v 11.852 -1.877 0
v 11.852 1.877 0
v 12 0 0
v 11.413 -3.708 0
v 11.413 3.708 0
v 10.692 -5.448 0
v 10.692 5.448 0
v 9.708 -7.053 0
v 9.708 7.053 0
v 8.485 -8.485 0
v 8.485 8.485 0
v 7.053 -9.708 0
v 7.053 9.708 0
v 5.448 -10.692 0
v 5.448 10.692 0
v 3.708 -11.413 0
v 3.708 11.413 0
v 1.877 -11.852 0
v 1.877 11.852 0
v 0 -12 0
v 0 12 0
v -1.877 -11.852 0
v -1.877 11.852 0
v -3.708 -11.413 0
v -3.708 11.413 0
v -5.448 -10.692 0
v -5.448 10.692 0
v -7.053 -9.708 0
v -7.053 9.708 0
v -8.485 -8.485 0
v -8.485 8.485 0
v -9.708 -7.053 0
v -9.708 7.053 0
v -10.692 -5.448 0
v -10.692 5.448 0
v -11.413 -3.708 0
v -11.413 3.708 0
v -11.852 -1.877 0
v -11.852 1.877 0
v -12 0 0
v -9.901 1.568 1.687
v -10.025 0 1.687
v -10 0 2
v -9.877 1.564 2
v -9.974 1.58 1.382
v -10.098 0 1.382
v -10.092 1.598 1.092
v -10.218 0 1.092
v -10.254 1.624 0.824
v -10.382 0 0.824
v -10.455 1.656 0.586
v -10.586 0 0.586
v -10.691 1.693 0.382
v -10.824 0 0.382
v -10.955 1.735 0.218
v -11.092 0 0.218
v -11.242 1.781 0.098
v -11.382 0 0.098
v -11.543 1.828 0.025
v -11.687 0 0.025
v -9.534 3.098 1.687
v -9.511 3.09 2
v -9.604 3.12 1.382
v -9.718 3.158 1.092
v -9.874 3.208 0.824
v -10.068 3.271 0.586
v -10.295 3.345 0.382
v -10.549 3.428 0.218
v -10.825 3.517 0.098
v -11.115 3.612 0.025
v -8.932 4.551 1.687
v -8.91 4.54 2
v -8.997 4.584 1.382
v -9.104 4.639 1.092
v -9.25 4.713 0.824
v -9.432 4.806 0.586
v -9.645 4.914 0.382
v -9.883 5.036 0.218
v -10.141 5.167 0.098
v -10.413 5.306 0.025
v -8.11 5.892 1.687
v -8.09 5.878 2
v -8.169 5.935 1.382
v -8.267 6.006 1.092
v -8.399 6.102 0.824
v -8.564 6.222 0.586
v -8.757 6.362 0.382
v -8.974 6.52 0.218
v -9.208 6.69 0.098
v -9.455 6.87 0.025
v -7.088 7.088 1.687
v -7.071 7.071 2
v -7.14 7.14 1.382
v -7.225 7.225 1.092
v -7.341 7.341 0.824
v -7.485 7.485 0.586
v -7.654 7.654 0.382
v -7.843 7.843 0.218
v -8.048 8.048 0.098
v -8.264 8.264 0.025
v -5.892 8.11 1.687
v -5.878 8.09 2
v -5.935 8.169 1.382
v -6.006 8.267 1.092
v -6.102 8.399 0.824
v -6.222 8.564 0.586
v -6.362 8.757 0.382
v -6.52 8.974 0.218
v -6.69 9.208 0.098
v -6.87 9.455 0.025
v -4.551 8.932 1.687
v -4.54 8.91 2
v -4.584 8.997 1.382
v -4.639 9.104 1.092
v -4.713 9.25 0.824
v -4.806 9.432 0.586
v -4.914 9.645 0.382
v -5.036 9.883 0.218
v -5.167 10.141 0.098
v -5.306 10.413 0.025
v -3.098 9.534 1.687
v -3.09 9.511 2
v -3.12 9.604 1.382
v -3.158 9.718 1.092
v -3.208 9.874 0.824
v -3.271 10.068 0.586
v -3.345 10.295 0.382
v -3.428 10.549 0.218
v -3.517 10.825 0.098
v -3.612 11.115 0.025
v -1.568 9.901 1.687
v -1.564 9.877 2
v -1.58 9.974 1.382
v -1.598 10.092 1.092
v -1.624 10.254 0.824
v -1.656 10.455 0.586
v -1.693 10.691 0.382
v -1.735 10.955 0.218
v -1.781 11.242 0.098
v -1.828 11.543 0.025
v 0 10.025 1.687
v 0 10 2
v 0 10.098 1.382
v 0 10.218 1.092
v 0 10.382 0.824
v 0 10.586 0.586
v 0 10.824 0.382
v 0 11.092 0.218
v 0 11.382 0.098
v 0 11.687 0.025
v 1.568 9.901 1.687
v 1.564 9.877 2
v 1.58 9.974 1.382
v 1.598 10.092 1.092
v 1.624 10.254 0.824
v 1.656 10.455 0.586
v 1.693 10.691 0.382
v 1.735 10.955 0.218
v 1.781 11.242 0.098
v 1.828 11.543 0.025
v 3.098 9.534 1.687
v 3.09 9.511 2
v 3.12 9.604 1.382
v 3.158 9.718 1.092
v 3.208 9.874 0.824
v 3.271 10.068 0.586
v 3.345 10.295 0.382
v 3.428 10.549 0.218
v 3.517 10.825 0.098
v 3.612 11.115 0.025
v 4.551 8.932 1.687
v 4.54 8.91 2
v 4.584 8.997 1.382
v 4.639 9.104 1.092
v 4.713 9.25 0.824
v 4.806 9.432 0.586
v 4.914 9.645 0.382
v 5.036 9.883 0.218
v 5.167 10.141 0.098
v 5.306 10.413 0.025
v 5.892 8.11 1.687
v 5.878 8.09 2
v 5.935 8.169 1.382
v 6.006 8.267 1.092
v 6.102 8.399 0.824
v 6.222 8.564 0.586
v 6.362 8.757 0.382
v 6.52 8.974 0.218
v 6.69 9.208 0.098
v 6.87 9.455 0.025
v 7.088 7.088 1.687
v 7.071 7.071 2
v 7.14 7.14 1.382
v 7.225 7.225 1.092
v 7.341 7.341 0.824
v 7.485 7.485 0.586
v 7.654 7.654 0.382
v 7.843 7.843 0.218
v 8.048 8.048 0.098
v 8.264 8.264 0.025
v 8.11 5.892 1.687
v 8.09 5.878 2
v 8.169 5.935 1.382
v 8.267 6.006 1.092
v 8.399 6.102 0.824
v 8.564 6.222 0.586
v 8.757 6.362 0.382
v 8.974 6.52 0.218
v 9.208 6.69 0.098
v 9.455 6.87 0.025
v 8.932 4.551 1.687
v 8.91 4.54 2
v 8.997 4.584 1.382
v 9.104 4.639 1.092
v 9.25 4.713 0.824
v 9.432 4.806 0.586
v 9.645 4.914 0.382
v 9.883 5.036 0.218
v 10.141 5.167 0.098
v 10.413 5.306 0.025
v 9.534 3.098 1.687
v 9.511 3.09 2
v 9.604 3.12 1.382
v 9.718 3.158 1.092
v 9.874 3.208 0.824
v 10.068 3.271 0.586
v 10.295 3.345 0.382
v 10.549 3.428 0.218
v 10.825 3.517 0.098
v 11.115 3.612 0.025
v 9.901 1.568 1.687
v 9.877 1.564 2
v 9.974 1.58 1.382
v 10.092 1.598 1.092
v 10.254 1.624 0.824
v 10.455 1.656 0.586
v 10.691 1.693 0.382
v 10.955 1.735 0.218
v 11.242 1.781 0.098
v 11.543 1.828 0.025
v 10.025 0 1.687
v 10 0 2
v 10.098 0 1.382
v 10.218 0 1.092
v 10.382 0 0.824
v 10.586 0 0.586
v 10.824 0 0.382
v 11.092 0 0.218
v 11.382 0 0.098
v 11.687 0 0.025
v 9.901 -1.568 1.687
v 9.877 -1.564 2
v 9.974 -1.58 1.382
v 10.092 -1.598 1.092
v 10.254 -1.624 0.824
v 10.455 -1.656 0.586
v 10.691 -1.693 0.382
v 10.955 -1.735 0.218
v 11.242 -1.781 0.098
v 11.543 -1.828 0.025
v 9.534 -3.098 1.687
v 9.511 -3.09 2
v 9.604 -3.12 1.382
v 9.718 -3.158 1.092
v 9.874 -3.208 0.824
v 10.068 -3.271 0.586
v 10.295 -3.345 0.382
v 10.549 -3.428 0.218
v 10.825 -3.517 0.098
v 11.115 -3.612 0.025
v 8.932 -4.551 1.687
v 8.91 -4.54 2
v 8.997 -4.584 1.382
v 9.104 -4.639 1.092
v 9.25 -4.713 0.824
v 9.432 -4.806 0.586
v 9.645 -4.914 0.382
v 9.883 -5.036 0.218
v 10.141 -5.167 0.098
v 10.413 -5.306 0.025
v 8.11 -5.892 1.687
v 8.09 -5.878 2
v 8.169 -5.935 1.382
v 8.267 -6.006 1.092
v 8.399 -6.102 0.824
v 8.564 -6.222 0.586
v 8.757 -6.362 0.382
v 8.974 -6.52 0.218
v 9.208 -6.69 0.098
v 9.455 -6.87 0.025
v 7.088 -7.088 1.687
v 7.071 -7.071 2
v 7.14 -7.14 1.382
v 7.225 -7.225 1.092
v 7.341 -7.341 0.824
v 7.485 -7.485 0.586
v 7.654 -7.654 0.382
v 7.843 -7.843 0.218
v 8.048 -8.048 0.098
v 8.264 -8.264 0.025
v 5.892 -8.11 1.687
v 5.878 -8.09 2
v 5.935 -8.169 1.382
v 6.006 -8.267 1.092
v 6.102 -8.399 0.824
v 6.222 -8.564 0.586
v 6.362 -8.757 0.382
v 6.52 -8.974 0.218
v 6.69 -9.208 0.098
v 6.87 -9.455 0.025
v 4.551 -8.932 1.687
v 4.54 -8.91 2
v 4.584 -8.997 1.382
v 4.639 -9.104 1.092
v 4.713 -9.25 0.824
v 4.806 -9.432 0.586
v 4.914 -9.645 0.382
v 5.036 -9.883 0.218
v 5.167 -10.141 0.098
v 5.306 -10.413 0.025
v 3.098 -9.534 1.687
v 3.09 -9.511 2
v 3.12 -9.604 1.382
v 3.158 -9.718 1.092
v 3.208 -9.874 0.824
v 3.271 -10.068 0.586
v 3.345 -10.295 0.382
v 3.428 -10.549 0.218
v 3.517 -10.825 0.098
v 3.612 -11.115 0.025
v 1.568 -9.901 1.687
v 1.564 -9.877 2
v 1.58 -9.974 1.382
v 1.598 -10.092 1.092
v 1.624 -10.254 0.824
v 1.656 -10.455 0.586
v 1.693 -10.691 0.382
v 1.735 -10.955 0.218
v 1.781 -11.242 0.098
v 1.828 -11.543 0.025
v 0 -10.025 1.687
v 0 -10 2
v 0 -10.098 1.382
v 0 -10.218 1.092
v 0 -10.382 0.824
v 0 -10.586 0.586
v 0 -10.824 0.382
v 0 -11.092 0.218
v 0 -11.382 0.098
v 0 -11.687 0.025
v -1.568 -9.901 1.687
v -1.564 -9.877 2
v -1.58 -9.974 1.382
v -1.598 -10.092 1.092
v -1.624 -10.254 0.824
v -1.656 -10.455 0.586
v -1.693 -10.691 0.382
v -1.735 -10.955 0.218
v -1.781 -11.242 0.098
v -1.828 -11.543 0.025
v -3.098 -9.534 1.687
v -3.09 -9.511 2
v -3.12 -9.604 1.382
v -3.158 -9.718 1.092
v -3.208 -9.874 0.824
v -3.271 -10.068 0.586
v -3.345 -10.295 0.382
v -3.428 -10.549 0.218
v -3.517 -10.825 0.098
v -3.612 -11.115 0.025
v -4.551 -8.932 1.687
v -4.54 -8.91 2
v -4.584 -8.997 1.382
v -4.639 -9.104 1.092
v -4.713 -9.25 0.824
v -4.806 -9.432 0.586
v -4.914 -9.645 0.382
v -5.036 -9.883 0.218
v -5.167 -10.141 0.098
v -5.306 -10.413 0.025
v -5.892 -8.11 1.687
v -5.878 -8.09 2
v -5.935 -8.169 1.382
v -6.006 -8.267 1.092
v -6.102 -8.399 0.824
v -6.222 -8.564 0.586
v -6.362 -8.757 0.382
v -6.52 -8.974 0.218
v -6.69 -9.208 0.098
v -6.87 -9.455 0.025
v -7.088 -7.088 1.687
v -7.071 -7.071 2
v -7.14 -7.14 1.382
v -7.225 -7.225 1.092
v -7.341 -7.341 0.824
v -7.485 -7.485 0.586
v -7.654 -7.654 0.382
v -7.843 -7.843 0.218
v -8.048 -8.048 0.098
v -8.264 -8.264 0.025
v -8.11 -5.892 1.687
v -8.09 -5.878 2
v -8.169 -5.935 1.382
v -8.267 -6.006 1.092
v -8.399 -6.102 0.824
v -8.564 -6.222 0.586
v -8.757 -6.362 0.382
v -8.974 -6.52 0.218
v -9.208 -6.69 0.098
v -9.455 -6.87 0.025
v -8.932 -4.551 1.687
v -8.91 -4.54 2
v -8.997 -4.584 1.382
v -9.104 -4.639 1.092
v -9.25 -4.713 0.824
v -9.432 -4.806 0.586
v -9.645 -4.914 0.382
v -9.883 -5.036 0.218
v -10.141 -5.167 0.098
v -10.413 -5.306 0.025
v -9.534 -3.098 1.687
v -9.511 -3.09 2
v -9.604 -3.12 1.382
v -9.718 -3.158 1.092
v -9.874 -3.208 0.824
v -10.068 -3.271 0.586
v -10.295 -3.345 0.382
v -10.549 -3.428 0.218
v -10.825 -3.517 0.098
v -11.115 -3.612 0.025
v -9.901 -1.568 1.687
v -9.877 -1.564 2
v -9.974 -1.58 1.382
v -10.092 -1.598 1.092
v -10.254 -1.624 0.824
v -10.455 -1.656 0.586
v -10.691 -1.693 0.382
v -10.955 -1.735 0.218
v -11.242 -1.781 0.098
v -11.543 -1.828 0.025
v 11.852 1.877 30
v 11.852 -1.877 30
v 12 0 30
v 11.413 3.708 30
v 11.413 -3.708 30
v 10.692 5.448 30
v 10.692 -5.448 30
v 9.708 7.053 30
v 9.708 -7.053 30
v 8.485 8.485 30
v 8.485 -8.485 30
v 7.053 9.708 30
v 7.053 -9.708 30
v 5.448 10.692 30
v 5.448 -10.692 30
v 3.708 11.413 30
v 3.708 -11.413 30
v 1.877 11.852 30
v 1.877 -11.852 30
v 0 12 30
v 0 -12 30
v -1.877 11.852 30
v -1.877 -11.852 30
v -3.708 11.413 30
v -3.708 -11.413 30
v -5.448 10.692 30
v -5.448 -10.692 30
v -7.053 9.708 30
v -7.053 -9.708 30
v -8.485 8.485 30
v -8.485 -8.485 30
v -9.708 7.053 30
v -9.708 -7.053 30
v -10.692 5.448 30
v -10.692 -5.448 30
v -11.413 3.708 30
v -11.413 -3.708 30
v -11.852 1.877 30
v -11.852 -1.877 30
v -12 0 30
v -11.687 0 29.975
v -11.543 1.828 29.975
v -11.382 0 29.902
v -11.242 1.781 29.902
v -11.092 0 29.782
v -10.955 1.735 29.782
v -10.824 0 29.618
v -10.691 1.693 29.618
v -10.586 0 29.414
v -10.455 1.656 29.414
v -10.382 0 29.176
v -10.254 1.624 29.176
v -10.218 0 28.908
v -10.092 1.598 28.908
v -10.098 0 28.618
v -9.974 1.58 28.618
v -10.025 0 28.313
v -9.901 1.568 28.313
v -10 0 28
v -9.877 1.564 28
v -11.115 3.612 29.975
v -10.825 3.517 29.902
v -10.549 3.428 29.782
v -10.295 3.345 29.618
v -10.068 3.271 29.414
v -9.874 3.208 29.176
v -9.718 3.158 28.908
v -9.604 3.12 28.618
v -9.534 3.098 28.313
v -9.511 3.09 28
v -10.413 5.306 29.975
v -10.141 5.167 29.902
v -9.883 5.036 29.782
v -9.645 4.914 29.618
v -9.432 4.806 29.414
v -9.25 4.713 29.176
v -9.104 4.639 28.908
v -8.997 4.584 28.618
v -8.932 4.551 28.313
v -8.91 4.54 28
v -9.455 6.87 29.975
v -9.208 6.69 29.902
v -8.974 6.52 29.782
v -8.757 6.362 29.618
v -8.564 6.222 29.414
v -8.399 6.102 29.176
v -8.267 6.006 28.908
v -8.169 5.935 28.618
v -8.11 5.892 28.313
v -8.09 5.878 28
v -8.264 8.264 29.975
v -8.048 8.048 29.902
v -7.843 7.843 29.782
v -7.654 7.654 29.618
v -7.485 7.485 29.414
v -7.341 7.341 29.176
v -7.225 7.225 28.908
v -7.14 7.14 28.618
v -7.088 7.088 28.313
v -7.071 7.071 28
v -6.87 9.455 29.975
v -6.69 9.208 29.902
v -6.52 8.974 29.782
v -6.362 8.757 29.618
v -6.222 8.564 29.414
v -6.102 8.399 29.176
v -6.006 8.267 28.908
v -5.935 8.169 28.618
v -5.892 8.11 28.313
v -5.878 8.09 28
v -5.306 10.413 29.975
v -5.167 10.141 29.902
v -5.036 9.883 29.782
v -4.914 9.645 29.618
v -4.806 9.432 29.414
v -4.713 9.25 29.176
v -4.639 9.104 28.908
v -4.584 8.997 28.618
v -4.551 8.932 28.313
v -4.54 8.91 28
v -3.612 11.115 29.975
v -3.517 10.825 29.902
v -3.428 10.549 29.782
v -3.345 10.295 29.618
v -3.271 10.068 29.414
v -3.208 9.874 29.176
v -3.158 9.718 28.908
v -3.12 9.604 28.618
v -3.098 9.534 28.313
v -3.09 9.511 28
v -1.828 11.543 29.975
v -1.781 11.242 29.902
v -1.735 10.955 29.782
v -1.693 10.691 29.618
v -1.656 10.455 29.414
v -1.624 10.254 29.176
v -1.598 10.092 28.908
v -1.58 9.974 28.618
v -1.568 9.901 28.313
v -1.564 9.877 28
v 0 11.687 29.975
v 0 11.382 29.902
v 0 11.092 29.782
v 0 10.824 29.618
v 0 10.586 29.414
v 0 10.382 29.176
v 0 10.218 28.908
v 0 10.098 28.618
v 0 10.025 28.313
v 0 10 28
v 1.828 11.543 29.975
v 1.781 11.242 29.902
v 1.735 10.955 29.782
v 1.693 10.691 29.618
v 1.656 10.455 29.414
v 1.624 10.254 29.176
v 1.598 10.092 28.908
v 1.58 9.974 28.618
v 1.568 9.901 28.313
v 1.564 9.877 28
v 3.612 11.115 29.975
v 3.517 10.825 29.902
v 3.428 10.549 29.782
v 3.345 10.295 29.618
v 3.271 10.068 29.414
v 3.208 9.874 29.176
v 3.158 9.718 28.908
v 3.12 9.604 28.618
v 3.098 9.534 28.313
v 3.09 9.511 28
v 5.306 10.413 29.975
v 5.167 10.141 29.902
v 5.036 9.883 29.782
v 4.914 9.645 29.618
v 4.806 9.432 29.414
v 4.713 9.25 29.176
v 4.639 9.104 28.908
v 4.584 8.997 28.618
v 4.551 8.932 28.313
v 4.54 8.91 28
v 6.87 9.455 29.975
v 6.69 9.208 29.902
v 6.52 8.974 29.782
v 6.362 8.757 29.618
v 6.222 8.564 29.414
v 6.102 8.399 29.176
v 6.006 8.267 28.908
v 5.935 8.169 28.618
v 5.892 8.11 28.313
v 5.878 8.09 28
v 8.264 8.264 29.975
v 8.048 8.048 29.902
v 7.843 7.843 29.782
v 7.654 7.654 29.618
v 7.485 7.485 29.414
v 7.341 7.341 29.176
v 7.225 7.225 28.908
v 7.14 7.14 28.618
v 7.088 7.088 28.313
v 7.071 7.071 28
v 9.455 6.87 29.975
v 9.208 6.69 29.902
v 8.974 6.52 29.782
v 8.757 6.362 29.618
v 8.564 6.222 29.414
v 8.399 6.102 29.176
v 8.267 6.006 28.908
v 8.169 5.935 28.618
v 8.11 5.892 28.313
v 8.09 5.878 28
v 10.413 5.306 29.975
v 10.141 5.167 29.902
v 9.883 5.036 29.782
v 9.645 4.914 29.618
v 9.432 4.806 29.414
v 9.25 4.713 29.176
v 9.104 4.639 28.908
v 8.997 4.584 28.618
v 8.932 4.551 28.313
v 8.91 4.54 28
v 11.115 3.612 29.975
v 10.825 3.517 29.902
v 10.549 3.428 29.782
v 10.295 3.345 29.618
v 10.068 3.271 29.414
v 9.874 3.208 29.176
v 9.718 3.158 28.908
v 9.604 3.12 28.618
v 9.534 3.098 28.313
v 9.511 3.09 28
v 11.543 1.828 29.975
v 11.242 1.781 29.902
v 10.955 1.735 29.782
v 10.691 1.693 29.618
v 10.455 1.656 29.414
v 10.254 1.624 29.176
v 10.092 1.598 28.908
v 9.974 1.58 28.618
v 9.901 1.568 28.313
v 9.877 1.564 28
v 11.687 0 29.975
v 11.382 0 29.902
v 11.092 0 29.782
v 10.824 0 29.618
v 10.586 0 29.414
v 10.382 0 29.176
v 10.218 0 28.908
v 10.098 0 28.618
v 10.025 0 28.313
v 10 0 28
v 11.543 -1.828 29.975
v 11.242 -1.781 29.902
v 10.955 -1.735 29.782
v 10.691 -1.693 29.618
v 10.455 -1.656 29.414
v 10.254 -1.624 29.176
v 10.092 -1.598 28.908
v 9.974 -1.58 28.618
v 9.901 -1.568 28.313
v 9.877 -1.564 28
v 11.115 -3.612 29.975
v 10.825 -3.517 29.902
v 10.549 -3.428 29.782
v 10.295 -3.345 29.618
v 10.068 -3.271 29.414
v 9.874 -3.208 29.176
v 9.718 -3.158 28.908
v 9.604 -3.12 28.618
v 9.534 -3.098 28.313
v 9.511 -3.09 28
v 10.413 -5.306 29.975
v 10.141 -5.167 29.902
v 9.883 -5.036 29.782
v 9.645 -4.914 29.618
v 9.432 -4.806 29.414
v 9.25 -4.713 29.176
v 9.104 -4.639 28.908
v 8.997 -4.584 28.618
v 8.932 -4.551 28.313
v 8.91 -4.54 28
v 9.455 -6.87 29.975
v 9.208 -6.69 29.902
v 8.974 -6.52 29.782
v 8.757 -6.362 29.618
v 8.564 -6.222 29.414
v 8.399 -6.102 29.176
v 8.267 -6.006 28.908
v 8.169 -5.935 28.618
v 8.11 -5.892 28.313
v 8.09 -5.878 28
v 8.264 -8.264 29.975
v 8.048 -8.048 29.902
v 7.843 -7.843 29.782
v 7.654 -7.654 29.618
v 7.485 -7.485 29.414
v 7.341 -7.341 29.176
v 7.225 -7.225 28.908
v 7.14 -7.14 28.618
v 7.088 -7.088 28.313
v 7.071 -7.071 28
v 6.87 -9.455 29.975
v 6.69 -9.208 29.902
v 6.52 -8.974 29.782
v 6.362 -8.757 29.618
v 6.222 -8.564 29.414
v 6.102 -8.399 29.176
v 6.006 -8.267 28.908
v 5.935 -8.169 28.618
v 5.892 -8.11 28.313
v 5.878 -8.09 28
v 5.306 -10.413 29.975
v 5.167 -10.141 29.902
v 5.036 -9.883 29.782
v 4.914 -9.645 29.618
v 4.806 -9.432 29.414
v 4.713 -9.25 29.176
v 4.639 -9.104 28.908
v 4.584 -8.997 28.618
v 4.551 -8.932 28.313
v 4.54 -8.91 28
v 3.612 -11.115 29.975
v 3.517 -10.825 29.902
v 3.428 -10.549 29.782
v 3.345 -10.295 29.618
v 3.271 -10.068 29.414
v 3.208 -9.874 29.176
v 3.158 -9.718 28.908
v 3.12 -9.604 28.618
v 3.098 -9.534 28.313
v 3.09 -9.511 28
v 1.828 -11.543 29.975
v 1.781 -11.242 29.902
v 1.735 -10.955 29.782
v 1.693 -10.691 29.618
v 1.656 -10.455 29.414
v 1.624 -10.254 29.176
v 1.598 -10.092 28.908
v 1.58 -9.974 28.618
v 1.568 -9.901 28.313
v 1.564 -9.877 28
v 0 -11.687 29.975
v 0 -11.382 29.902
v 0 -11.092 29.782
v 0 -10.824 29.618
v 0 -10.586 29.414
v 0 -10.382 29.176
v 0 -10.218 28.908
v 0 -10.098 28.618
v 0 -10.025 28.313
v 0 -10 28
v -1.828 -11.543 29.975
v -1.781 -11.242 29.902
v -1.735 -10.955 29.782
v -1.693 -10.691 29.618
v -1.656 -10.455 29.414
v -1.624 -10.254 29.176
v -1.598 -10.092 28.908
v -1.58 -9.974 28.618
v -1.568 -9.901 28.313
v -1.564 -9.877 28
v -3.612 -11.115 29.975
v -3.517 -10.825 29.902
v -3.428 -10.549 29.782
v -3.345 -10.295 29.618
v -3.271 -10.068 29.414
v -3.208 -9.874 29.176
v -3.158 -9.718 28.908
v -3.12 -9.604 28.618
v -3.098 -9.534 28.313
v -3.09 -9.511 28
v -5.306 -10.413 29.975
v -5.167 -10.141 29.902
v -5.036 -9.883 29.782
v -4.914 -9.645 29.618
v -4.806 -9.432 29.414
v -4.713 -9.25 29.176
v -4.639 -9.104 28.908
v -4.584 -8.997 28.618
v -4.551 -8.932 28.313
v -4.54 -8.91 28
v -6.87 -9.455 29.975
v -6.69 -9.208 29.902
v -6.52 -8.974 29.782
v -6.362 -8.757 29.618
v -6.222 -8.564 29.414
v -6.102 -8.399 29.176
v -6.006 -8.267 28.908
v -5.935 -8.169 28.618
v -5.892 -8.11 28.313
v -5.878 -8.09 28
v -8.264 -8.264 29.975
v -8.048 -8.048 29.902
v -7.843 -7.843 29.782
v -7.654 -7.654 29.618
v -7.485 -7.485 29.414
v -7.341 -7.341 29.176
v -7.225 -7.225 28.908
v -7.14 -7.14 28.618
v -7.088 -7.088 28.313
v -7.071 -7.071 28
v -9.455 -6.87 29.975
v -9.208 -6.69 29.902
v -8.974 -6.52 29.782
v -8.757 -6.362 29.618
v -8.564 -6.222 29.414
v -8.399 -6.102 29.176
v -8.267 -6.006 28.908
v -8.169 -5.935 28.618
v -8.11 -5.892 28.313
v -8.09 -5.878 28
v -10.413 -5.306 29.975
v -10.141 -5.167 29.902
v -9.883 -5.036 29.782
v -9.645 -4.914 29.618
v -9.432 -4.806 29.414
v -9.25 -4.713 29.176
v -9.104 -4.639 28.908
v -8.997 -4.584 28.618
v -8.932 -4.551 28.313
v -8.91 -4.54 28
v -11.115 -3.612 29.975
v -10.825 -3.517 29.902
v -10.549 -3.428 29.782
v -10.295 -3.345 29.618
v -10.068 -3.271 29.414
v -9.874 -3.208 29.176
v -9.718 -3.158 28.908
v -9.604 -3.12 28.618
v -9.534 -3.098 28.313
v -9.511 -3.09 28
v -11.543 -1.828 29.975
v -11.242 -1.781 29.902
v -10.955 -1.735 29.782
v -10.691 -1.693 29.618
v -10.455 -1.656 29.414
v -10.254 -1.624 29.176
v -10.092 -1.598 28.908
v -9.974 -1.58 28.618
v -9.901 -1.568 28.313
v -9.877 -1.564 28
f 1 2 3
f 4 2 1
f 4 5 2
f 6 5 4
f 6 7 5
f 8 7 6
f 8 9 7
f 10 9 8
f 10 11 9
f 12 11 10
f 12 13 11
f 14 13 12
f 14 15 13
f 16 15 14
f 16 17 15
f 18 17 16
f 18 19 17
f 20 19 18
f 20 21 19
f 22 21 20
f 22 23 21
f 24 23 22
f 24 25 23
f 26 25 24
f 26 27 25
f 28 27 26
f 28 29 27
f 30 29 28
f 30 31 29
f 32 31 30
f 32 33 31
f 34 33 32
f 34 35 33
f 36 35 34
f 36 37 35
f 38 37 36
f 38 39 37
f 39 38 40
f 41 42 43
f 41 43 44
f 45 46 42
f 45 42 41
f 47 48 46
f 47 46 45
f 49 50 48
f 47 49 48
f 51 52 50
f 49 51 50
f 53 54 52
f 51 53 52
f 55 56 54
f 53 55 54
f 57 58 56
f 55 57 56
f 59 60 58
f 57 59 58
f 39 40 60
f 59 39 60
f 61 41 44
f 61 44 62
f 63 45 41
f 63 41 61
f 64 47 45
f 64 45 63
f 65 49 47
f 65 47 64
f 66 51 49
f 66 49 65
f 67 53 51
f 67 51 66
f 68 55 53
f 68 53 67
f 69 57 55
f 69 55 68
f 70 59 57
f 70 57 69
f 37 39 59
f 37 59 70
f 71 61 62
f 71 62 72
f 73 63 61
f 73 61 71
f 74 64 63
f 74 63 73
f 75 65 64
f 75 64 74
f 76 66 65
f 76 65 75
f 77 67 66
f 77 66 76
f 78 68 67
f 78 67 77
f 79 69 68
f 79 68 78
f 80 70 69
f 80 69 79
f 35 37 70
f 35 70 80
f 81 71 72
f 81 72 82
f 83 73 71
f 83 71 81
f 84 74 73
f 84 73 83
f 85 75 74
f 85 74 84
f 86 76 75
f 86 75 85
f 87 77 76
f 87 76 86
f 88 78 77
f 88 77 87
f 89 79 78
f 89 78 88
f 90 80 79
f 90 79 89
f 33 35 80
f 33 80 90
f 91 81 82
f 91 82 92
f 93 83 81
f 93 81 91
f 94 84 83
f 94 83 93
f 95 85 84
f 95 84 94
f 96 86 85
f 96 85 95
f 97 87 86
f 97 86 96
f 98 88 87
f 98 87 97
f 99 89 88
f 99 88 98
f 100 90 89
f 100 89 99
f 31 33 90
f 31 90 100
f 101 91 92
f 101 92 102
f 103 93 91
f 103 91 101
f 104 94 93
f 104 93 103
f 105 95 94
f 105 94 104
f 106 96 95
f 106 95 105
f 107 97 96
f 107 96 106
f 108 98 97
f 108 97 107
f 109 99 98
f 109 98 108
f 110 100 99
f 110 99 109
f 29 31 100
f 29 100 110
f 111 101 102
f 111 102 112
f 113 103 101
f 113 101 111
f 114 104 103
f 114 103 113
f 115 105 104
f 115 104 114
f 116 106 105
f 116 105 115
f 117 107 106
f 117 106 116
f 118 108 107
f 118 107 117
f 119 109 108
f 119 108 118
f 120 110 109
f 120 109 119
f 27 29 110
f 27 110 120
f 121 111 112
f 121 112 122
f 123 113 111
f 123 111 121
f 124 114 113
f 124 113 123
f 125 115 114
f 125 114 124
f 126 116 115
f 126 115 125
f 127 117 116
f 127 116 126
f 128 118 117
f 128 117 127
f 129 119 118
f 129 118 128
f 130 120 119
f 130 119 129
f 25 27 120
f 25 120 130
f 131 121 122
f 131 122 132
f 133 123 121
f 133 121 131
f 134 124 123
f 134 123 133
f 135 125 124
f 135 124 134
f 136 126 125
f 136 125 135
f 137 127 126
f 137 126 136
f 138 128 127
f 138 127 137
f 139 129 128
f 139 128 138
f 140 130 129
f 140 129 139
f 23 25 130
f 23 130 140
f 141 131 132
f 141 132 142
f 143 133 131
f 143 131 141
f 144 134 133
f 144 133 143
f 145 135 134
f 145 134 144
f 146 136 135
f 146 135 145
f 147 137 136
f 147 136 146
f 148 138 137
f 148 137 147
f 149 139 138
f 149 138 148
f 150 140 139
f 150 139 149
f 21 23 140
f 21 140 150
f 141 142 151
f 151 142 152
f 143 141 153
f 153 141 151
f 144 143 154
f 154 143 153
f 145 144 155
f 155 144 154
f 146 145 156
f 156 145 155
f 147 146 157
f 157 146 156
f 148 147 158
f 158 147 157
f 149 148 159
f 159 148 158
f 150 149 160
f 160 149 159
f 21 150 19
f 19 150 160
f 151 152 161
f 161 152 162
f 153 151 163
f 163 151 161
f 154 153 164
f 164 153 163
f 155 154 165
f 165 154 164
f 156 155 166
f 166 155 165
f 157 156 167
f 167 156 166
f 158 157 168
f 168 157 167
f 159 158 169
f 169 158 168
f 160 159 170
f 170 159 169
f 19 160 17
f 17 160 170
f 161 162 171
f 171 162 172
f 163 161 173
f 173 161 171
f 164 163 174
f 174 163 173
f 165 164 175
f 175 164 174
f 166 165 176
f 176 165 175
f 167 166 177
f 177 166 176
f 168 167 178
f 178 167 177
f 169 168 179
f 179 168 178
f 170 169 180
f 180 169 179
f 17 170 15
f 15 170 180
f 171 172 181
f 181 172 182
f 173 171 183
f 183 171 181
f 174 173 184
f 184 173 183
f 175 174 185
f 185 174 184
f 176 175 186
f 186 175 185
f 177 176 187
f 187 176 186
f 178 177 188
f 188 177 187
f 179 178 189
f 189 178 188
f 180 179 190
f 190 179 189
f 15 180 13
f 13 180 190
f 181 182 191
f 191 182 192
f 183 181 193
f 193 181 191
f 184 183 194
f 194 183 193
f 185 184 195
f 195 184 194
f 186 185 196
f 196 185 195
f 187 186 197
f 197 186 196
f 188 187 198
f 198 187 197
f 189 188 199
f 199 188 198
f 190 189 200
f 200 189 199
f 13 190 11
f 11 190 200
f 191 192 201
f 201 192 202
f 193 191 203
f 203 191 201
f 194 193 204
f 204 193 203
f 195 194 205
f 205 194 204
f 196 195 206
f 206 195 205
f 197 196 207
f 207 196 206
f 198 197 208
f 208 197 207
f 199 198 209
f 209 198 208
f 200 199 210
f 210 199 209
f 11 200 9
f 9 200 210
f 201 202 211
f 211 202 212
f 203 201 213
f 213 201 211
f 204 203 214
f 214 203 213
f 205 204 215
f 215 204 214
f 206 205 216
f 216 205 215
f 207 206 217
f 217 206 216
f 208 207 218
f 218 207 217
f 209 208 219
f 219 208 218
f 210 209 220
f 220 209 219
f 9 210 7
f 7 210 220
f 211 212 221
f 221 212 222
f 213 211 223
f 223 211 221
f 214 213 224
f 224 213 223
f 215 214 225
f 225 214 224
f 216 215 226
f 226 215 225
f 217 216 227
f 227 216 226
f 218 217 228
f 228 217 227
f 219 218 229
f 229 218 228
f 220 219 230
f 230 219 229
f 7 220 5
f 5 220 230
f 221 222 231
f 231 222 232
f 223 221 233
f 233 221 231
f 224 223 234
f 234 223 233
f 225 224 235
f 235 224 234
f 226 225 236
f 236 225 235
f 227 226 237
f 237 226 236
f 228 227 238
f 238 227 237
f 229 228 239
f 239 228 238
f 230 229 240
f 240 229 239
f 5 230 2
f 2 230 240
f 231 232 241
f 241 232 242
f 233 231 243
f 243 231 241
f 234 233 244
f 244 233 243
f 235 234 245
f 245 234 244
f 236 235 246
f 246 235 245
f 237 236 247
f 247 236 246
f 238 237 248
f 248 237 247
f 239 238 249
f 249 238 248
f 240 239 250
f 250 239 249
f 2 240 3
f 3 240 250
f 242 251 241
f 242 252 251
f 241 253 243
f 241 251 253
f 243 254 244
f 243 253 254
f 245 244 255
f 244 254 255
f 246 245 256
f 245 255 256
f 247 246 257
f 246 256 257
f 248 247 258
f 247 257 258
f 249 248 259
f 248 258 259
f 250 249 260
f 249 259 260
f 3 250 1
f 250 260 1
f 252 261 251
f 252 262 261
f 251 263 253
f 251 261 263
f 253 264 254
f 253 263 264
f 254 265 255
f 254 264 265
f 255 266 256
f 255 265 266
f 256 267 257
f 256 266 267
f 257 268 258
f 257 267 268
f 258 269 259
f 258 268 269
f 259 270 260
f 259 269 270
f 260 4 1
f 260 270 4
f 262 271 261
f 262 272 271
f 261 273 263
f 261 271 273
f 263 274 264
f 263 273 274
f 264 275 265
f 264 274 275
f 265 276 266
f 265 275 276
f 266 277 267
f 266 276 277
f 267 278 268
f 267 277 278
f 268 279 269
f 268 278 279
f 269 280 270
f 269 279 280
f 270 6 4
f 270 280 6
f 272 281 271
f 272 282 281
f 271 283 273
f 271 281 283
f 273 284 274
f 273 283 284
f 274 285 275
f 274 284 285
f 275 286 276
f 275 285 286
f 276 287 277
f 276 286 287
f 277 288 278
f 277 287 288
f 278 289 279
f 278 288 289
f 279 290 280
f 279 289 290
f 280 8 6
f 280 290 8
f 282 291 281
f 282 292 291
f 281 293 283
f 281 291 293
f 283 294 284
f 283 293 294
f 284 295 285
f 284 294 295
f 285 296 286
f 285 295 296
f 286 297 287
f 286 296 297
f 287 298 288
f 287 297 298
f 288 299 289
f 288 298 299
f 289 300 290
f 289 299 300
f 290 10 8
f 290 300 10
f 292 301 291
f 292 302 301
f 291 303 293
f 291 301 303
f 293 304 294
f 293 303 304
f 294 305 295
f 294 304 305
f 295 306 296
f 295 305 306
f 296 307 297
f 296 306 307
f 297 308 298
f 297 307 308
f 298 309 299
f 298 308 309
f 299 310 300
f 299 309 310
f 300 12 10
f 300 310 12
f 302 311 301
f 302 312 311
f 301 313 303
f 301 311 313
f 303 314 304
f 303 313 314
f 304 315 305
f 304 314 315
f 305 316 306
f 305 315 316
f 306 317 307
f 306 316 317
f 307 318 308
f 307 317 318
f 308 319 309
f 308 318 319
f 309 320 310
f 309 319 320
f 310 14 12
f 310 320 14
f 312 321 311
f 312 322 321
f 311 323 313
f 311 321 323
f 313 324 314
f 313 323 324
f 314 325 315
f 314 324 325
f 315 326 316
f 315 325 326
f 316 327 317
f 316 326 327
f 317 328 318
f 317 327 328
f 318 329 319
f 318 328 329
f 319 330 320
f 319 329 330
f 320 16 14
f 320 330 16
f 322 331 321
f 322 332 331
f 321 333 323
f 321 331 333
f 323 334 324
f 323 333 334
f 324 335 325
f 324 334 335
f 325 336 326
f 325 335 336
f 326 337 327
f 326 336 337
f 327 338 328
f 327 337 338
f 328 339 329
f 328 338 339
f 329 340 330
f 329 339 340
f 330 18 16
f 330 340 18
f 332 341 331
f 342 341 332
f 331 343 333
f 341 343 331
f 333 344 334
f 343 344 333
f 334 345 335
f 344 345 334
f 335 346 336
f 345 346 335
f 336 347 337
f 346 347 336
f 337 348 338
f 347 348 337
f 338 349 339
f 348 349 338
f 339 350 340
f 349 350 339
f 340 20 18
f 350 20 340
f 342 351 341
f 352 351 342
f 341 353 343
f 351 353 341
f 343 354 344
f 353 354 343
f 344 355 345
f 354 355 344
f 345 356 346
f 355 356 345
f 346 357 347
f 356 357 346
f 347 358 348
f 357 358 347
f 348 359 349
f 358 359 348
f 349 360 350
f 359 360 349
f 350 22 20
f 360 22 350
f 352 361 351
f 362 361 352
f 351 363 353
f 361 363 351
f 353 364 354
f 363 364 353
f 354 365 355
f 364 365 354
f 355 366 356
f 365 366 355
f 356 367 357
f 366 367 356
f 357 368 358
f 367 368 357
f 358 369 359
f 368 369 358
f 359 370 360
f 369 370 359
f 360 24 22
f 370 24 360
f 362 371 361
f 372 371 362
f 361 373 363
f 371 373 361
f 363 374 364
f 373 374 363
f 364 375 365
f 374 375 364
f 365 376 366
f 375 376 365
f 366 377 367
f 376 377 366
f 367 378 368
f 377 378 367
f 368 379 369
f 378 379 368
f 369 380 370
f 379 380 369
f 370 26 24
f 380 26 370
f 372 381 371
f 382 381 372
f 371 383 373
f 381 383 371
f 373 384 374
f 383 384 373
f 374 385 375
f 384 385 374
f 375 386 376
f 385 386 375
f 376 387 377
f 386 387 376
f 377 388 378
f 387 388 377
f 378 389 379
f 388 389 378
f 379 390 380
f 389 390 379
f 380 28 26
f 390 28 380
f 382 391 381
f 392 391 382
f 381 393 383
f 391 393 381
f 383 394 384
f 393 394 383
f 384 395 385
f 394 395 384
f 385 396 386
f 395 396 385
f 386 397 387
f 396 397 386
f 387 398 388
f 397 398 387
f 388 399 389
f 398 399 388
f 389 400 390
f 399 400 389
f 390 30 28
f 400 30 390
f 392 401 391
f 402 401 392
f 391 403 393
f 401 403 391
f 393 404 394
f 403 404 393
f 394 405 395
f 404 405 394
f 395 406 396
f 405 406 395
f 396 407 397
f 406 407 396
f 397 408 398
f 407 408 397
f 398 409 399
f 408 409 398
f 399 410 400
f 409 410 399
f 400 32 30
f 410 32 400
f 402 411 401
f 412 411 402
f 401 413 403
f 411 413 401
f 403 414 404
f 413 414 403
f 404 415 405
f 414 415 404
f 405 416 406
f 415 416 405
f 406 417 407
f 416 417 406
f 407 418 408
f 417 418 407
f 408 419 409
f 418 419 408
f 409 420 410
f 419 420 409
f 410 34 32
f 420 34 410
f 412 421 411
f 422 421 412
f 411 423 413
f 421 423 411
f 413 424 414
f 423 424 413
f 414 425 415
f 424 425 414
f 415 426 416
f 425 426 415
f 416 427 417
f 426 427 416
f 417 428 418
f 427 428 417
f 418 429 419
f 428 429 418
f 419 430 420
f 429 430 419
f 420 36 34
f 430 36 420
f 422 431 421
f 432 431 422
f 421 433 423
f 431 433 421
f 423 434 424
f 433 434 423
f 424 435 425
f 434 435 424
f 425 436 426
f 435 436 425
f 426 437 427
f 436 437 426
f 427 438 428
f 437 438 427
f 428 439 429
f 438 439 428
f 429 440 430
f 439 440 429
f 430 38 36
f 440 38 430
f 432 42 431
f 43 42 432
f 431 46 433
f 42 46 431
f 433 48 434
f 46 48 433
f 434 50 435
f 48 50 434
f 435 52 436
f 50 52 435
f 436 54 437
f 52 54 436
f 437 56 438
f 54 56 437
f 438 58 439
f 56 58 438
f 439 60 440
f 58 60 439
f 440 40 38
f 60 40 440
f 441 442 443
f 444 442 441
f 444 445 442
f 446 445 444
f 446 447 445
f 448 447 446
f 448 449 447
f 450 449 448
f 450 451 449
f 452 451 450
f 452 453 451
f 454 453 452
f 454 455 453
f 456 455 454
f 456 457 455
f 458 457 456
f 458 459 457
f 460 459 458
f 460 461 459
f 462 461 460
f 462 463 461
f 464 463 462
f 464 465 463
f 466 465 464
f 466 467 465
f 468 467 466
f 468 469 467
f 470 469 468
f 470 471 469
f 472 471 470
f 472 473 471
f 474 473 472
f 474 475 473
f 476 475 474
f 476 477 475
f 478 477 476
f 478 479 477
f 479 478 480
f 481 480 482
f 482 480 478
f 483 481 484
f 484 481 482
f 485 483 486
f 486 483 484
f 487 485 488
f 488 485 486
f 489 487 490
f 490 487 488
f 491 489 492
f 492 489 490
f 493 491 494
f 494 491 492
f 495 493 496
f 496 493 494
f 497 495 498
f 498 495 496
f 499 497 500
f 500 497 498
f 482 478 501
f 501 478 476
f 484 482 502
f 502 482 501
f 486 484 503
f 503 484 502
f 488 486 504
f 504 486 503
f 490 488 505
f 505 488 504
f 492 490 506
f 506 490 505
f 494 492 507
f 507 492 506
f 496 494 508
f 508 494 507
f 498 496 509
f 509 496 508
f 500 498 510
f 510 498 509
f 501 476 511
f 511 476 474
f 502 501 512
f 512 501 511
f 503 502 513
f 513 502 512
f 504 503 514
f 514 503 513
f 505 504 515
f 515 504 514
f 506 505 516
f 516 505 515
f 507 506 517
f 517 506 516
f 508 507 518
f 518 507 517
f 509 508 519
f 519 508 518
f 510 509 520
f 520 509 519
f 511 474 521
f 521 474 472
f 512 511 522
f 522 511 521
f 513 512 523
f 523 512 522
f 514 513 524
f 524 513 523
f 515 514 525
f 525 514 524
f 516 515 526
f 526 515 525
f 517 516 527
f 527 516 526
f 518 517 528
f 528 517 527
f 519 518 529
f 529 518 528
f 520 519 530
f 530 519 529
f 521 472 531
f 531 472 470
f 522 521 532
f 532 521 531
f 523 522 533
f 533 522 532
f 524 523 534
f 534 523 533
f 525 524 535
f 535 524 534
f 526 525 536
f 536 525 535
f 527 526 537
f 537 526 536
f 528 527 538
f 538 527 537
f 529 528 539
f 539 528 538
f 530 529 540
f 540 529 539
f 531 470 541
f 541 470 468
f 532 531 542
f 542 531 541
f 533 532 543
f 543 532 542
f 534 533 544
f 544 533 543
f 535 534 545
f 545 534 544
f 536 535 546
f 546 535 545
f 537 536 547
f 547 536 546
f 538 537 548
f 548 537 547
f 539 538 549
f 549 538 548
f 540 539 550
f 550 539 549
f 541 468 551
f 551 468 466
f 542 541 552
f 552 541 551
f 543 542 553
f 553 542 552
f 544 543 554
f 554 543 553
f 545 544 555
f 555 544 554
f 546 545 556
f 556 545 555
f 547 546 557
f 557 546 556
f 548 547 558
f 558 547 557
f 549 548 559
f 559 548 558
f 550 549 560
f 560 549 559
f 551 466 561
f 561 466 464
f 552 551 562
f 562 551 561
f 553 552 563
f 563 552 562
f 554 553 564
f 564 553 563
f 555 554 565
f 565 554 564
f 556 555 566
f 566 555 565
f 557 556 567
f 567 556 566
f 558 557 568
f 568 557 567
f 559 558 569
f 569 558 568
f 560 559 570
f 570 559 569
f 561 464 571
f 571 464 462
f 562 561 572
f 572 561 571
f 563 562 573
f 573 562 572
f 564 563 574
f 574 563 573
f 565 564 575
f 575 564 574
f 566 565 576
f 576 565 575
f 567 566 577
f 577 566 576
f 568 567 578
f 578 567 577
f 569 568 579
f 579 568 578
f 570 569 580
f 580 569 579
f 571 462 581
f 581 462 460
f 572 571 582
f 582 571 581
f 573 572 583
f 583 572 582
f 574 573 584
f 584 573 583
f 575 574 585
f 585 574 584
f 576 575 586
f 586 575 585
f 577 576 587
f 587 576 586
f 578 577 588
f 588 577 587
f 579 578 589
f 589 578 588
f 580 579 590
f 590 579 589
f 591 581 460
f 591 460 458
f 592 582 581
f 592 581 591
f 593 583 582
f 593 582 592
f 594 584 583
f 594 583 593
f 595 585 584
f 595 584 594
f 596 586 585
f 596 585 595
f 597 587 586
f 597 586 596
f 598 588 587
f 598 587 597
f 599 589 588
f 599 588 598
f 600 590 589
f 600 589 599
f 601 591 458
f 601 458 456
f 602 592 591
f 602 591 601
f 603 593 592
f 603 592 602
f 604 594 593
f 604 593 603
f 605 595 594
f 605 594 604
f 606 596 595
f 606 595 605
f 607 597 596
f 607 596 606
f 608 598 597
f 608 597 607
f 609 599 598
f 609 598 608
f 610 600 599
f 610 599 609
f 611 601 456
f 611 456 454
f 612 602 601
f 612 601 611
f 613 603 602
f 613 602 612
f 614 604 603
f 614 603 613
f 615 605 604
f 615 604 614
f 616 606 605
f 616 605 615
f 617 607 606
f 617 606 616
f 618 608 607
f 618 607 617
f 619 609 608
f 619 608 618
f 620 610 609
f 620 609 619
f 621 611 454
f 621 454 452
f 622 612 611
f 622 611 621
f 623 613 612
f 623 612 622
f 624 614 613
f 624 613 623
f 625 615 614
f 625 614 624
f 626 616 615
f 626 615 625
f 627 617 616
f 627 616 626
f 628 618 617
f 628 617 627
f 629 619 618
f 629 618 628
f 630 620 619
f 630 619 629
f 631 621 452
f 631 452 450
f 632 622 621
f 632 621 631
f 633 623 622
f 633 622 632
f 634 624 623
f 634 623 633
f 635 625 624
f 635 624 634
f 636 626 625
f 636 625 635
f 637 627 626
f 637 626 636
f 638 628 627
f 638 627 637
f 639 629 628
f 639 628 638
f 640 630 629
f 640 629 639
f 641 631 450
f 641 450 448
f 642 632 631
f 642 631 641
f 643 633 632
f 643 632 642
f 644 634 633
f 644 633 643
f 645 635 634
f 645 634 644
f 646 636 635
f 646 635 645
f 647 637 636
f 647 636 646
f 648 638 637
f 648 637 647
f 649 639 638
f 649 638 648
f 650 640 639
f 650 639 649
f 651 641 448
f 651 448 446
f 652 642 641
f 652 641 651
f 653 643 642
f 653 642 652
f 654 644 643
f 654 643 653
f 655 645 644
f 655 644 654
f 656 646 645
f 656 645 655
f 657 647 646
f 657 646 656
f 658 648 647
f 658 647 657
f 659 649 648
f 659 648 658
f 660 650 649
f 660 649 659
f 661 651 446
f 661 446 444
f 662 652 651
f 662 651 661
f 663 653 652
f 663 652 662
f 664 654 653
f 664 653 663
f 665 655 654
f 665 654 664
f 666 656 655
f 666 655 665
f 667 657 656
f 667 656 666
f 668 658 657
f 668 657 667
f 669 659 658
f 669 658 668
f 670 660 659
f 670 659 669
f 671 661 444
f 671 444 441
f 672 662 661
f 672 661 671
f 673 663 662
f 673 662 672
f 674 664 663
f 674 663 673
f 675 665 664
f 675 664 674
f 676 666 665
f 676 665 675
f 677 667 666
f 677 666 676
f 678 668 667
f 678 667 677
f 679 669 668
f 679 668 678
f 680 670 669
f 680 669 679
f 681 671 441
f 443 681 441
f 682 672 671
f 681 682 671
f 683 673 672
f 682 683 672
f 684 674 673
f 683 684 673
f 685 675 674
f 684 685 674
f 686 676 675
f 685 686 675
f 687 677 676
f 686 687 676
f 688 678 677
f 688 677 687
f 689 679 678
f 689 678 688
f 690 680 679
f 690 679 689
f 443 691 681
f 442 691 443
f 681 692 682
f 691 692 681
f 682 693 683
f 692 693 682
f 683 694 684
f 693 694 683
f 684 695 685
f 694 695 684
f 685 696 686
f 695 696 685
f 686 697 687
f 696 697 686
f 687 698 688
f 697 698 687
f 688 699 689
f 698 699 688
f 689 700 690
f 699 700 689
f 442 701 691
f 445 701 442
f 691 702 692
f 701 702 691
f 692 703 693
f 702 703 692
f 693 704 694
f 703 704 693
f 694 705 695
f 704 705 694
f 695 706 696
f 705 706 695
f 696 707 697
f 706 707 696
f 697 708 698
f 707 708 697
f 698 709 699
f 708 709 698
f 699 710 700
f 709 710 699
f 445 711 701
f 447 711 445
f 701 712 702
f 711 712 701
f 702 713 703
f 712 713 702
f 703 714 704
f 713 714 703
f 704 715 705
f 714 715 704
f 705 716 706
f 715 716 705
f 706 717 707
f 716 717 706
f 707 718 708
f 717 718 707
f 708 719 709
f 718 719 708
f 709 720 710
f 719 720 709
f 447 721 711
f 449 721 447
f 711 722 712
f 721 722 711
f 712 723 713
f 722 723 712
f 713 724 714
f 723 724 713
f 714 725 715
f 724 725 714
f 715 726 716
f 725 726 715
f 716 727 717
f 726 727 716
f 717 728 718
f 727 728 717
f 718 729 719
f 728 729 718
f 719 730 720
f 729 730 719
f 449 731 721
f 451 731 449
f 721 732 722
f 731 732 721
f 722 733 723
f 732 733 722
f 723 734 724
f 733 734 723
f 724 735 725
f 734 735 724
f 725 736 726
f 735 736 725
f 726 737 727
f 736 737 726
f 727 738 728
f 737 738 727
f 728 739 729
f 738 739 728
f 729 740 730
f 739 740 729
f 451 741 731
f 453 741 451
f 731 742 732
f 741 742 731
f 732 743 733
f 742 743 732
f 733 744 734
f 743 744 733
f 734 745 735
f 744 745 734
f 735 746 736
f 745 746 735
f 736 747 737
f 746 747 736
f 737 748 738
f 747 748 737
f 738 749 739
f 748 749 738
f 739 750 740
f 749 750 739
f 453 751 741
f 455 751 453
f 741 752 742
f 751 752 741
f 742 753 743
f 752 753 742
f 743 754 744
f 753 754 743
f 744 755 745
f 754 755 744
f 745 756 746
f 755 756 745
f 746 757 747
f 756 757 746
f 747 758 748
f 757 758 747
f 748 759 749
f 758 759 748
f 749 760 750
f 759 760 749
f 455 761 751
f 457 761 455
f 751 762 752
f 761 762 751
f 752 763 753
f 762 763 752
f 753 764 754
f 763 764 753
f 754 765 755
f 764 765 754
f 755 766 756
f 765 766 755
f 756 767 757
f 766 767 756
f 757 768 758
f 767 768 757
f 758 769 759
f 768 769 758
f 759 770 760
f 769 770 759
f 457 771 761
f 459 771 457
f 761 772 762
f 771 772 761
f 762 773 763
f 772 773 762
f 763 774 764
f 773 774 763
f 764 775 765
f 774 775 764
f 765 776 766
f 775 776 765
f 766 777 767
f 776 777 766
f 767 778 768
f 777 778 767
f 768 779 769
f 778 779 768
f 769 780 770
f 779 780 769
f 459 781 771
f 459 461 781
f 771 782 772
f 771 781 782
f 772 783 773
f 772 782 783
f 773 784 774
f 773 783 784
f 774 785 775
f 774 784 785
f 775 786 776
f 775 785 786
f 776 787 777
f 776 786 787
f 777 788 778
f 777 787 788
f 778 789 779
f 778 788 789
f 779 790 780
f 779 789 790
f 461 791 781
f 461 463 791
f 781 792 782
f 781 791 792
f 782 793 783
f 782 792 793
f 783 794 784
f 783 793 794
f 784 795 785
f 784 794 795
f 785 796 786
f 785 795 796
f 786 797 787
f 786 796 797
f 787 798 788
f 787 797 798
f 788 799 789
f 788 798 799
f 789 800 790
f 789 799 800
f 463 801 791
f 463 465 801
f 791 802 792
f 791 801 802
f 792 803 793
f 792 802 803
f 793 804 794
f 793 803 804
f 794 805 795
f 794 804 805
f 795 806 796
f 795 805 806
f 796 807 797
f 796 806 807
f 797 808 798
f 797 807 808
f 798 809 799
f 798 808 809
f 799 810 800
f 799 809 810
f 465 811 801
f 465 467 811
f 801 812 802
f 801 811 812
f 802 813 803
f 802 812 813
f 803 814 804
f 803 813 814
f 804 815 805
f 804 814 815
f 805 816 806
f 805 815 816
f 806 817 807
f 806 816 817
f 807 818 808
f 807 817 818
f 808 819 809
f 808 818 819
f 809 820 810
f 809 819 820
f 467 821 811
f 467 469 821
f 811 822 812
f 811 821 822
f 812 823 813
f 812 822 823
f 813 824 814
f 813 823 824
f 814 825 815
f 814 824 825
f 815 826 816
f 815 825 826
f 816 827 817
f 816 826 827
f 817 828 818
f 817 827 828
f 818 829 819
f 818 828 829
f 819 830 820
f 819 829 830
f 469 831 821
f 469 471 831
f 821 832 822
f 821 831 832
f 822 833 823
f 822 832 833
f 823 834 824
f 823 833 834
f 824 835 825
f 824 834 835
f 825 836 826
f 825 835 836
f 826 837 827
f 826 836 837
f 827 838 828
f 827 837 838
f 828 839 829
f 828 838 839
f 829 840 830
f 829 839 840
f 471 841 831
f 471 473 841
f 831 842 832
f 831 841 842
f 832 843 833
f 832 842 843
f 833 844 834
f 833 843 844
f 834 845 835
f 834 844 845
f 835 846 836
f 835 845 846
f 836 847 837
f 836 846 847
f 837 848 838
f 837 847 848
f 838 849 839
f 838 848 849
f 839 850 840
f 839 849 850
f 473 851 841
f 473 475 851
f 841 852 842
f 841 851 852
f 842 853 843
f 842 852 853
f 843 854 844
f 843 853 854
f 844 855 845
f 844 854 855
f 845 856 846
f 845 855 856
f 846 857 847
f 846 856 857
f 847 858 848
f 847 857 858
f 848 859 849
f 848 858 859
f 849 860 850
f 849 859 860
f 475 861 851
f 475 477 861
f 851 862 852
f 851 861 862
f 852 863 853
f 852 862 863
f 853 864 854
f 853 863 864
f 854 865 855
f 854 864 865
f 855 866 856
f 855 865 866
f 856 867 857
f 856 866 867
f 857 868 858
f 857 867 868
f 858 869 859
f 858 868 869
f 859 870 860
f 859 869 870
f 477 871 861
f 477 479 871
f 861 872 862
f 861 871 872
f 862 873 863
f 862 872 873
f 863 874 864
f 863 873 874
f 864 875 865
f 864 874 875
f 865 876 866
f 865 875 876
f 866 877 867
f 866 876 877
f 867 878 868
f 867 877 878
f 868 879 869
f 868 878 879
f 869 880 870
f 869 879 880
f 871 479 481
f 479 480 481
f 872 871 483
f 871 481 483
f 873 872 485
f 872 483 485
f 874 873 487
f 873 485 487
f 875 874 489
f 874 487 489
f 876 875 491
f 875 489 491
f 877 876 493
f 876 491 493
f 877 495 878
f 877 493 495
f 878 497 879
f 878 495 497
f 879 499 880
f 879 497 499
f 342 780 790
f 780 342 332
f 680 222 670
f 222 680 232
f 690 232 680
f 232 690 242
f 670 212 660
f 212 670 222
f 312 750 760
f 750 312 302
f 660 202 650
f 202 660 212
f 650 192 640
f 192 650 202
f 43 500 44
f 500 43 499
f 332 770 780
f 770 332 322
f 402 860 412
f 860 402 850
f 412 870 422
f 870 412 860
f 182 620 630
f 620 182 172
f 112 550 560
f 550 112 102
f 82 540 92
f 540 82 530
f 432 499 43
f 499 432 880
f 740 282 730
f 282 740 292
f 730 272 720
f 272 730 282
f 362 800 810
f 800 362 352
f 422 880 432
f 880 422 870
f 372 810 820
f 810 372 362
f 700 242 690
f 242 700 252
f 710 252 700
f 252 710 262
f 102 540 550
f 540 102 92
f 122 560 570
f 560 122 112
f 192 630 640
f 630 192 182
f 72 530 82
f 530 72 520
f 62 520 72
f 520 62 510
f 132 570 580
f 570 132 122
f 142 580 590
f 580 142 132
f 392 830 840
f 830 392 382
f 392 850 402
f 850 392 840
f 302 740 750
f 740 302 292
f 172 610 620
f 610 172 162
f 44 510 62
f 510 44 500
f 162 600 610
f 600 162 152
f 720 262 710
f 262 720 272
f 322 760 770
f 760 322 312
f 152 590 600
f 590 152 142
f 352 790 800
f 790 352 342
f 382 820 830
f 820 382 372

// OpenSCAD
inner_height = 30;
inner_radius = 20;
wall_height = 3;
wall_thickness = 2;
/*
difference() {
    union() {
        cylinder(h=inner_height, r= inner_radius,$fn=100);
        cylinder(h=wall_thickness, r= inner_radius+ (2*wall_height),$fn=100);
        translate([0,0,inner_height-wall_thickness])cylinder(h=wall_thickness, r= inner_radius+ (2*wall_height),$fn=100);
    }
    cylinder(h=inner_height+2, r= 5,$fn=100);
}
*/
 klam_fillet_cylinder(30,10,2,2,40);



















































module klam_fillet_cylinder(
    cylinder_height=20,
    cylinder_radius=1,
    fillet_radius_bottom=1,
    fillet_radius_top=1,
    nfaces=50
) {
    /* created by Kevin Lam on Dec 3, 2016 */
    union() {      
        cylinder(cylinder_height, r=cylinder_radius, $fn=nfaces, false);
        
        if (fillet_radius_bottom > 0) {
            difference() {
                cylinder(fillet_radius_bottom, r=cylinder_radius+fillet_radius_bottom, $fn=nfaces, false);
                translate([0, 0, fillet_radius_bottom])
                rotate_extrude($fn=nfaces)
                translate([cylinder_radius+fillet_radius_bottom, 0, 0])
                circle(fillet_radius_bottom, $fn=nfaces);
            }
        }
        
        if (fillet_radius_top>0) {
            difference() {
                translate([0,0,cylinder_height-fillet_radius_top])
                cylinder(fillet_radius_top, r=cylinder_radius+fillet_radius_top, $fn=nfaces, false);
                
                translate([0, 0, cylinder_height-fillet_radius_top])
                rotate_extrude($fn=nfaces)
                translate([cylinder_radius+fillet_radius_top, 0, 0])
                circle(fillet_radius_top, $fn=nfaces);
            }
        }
    }
}
